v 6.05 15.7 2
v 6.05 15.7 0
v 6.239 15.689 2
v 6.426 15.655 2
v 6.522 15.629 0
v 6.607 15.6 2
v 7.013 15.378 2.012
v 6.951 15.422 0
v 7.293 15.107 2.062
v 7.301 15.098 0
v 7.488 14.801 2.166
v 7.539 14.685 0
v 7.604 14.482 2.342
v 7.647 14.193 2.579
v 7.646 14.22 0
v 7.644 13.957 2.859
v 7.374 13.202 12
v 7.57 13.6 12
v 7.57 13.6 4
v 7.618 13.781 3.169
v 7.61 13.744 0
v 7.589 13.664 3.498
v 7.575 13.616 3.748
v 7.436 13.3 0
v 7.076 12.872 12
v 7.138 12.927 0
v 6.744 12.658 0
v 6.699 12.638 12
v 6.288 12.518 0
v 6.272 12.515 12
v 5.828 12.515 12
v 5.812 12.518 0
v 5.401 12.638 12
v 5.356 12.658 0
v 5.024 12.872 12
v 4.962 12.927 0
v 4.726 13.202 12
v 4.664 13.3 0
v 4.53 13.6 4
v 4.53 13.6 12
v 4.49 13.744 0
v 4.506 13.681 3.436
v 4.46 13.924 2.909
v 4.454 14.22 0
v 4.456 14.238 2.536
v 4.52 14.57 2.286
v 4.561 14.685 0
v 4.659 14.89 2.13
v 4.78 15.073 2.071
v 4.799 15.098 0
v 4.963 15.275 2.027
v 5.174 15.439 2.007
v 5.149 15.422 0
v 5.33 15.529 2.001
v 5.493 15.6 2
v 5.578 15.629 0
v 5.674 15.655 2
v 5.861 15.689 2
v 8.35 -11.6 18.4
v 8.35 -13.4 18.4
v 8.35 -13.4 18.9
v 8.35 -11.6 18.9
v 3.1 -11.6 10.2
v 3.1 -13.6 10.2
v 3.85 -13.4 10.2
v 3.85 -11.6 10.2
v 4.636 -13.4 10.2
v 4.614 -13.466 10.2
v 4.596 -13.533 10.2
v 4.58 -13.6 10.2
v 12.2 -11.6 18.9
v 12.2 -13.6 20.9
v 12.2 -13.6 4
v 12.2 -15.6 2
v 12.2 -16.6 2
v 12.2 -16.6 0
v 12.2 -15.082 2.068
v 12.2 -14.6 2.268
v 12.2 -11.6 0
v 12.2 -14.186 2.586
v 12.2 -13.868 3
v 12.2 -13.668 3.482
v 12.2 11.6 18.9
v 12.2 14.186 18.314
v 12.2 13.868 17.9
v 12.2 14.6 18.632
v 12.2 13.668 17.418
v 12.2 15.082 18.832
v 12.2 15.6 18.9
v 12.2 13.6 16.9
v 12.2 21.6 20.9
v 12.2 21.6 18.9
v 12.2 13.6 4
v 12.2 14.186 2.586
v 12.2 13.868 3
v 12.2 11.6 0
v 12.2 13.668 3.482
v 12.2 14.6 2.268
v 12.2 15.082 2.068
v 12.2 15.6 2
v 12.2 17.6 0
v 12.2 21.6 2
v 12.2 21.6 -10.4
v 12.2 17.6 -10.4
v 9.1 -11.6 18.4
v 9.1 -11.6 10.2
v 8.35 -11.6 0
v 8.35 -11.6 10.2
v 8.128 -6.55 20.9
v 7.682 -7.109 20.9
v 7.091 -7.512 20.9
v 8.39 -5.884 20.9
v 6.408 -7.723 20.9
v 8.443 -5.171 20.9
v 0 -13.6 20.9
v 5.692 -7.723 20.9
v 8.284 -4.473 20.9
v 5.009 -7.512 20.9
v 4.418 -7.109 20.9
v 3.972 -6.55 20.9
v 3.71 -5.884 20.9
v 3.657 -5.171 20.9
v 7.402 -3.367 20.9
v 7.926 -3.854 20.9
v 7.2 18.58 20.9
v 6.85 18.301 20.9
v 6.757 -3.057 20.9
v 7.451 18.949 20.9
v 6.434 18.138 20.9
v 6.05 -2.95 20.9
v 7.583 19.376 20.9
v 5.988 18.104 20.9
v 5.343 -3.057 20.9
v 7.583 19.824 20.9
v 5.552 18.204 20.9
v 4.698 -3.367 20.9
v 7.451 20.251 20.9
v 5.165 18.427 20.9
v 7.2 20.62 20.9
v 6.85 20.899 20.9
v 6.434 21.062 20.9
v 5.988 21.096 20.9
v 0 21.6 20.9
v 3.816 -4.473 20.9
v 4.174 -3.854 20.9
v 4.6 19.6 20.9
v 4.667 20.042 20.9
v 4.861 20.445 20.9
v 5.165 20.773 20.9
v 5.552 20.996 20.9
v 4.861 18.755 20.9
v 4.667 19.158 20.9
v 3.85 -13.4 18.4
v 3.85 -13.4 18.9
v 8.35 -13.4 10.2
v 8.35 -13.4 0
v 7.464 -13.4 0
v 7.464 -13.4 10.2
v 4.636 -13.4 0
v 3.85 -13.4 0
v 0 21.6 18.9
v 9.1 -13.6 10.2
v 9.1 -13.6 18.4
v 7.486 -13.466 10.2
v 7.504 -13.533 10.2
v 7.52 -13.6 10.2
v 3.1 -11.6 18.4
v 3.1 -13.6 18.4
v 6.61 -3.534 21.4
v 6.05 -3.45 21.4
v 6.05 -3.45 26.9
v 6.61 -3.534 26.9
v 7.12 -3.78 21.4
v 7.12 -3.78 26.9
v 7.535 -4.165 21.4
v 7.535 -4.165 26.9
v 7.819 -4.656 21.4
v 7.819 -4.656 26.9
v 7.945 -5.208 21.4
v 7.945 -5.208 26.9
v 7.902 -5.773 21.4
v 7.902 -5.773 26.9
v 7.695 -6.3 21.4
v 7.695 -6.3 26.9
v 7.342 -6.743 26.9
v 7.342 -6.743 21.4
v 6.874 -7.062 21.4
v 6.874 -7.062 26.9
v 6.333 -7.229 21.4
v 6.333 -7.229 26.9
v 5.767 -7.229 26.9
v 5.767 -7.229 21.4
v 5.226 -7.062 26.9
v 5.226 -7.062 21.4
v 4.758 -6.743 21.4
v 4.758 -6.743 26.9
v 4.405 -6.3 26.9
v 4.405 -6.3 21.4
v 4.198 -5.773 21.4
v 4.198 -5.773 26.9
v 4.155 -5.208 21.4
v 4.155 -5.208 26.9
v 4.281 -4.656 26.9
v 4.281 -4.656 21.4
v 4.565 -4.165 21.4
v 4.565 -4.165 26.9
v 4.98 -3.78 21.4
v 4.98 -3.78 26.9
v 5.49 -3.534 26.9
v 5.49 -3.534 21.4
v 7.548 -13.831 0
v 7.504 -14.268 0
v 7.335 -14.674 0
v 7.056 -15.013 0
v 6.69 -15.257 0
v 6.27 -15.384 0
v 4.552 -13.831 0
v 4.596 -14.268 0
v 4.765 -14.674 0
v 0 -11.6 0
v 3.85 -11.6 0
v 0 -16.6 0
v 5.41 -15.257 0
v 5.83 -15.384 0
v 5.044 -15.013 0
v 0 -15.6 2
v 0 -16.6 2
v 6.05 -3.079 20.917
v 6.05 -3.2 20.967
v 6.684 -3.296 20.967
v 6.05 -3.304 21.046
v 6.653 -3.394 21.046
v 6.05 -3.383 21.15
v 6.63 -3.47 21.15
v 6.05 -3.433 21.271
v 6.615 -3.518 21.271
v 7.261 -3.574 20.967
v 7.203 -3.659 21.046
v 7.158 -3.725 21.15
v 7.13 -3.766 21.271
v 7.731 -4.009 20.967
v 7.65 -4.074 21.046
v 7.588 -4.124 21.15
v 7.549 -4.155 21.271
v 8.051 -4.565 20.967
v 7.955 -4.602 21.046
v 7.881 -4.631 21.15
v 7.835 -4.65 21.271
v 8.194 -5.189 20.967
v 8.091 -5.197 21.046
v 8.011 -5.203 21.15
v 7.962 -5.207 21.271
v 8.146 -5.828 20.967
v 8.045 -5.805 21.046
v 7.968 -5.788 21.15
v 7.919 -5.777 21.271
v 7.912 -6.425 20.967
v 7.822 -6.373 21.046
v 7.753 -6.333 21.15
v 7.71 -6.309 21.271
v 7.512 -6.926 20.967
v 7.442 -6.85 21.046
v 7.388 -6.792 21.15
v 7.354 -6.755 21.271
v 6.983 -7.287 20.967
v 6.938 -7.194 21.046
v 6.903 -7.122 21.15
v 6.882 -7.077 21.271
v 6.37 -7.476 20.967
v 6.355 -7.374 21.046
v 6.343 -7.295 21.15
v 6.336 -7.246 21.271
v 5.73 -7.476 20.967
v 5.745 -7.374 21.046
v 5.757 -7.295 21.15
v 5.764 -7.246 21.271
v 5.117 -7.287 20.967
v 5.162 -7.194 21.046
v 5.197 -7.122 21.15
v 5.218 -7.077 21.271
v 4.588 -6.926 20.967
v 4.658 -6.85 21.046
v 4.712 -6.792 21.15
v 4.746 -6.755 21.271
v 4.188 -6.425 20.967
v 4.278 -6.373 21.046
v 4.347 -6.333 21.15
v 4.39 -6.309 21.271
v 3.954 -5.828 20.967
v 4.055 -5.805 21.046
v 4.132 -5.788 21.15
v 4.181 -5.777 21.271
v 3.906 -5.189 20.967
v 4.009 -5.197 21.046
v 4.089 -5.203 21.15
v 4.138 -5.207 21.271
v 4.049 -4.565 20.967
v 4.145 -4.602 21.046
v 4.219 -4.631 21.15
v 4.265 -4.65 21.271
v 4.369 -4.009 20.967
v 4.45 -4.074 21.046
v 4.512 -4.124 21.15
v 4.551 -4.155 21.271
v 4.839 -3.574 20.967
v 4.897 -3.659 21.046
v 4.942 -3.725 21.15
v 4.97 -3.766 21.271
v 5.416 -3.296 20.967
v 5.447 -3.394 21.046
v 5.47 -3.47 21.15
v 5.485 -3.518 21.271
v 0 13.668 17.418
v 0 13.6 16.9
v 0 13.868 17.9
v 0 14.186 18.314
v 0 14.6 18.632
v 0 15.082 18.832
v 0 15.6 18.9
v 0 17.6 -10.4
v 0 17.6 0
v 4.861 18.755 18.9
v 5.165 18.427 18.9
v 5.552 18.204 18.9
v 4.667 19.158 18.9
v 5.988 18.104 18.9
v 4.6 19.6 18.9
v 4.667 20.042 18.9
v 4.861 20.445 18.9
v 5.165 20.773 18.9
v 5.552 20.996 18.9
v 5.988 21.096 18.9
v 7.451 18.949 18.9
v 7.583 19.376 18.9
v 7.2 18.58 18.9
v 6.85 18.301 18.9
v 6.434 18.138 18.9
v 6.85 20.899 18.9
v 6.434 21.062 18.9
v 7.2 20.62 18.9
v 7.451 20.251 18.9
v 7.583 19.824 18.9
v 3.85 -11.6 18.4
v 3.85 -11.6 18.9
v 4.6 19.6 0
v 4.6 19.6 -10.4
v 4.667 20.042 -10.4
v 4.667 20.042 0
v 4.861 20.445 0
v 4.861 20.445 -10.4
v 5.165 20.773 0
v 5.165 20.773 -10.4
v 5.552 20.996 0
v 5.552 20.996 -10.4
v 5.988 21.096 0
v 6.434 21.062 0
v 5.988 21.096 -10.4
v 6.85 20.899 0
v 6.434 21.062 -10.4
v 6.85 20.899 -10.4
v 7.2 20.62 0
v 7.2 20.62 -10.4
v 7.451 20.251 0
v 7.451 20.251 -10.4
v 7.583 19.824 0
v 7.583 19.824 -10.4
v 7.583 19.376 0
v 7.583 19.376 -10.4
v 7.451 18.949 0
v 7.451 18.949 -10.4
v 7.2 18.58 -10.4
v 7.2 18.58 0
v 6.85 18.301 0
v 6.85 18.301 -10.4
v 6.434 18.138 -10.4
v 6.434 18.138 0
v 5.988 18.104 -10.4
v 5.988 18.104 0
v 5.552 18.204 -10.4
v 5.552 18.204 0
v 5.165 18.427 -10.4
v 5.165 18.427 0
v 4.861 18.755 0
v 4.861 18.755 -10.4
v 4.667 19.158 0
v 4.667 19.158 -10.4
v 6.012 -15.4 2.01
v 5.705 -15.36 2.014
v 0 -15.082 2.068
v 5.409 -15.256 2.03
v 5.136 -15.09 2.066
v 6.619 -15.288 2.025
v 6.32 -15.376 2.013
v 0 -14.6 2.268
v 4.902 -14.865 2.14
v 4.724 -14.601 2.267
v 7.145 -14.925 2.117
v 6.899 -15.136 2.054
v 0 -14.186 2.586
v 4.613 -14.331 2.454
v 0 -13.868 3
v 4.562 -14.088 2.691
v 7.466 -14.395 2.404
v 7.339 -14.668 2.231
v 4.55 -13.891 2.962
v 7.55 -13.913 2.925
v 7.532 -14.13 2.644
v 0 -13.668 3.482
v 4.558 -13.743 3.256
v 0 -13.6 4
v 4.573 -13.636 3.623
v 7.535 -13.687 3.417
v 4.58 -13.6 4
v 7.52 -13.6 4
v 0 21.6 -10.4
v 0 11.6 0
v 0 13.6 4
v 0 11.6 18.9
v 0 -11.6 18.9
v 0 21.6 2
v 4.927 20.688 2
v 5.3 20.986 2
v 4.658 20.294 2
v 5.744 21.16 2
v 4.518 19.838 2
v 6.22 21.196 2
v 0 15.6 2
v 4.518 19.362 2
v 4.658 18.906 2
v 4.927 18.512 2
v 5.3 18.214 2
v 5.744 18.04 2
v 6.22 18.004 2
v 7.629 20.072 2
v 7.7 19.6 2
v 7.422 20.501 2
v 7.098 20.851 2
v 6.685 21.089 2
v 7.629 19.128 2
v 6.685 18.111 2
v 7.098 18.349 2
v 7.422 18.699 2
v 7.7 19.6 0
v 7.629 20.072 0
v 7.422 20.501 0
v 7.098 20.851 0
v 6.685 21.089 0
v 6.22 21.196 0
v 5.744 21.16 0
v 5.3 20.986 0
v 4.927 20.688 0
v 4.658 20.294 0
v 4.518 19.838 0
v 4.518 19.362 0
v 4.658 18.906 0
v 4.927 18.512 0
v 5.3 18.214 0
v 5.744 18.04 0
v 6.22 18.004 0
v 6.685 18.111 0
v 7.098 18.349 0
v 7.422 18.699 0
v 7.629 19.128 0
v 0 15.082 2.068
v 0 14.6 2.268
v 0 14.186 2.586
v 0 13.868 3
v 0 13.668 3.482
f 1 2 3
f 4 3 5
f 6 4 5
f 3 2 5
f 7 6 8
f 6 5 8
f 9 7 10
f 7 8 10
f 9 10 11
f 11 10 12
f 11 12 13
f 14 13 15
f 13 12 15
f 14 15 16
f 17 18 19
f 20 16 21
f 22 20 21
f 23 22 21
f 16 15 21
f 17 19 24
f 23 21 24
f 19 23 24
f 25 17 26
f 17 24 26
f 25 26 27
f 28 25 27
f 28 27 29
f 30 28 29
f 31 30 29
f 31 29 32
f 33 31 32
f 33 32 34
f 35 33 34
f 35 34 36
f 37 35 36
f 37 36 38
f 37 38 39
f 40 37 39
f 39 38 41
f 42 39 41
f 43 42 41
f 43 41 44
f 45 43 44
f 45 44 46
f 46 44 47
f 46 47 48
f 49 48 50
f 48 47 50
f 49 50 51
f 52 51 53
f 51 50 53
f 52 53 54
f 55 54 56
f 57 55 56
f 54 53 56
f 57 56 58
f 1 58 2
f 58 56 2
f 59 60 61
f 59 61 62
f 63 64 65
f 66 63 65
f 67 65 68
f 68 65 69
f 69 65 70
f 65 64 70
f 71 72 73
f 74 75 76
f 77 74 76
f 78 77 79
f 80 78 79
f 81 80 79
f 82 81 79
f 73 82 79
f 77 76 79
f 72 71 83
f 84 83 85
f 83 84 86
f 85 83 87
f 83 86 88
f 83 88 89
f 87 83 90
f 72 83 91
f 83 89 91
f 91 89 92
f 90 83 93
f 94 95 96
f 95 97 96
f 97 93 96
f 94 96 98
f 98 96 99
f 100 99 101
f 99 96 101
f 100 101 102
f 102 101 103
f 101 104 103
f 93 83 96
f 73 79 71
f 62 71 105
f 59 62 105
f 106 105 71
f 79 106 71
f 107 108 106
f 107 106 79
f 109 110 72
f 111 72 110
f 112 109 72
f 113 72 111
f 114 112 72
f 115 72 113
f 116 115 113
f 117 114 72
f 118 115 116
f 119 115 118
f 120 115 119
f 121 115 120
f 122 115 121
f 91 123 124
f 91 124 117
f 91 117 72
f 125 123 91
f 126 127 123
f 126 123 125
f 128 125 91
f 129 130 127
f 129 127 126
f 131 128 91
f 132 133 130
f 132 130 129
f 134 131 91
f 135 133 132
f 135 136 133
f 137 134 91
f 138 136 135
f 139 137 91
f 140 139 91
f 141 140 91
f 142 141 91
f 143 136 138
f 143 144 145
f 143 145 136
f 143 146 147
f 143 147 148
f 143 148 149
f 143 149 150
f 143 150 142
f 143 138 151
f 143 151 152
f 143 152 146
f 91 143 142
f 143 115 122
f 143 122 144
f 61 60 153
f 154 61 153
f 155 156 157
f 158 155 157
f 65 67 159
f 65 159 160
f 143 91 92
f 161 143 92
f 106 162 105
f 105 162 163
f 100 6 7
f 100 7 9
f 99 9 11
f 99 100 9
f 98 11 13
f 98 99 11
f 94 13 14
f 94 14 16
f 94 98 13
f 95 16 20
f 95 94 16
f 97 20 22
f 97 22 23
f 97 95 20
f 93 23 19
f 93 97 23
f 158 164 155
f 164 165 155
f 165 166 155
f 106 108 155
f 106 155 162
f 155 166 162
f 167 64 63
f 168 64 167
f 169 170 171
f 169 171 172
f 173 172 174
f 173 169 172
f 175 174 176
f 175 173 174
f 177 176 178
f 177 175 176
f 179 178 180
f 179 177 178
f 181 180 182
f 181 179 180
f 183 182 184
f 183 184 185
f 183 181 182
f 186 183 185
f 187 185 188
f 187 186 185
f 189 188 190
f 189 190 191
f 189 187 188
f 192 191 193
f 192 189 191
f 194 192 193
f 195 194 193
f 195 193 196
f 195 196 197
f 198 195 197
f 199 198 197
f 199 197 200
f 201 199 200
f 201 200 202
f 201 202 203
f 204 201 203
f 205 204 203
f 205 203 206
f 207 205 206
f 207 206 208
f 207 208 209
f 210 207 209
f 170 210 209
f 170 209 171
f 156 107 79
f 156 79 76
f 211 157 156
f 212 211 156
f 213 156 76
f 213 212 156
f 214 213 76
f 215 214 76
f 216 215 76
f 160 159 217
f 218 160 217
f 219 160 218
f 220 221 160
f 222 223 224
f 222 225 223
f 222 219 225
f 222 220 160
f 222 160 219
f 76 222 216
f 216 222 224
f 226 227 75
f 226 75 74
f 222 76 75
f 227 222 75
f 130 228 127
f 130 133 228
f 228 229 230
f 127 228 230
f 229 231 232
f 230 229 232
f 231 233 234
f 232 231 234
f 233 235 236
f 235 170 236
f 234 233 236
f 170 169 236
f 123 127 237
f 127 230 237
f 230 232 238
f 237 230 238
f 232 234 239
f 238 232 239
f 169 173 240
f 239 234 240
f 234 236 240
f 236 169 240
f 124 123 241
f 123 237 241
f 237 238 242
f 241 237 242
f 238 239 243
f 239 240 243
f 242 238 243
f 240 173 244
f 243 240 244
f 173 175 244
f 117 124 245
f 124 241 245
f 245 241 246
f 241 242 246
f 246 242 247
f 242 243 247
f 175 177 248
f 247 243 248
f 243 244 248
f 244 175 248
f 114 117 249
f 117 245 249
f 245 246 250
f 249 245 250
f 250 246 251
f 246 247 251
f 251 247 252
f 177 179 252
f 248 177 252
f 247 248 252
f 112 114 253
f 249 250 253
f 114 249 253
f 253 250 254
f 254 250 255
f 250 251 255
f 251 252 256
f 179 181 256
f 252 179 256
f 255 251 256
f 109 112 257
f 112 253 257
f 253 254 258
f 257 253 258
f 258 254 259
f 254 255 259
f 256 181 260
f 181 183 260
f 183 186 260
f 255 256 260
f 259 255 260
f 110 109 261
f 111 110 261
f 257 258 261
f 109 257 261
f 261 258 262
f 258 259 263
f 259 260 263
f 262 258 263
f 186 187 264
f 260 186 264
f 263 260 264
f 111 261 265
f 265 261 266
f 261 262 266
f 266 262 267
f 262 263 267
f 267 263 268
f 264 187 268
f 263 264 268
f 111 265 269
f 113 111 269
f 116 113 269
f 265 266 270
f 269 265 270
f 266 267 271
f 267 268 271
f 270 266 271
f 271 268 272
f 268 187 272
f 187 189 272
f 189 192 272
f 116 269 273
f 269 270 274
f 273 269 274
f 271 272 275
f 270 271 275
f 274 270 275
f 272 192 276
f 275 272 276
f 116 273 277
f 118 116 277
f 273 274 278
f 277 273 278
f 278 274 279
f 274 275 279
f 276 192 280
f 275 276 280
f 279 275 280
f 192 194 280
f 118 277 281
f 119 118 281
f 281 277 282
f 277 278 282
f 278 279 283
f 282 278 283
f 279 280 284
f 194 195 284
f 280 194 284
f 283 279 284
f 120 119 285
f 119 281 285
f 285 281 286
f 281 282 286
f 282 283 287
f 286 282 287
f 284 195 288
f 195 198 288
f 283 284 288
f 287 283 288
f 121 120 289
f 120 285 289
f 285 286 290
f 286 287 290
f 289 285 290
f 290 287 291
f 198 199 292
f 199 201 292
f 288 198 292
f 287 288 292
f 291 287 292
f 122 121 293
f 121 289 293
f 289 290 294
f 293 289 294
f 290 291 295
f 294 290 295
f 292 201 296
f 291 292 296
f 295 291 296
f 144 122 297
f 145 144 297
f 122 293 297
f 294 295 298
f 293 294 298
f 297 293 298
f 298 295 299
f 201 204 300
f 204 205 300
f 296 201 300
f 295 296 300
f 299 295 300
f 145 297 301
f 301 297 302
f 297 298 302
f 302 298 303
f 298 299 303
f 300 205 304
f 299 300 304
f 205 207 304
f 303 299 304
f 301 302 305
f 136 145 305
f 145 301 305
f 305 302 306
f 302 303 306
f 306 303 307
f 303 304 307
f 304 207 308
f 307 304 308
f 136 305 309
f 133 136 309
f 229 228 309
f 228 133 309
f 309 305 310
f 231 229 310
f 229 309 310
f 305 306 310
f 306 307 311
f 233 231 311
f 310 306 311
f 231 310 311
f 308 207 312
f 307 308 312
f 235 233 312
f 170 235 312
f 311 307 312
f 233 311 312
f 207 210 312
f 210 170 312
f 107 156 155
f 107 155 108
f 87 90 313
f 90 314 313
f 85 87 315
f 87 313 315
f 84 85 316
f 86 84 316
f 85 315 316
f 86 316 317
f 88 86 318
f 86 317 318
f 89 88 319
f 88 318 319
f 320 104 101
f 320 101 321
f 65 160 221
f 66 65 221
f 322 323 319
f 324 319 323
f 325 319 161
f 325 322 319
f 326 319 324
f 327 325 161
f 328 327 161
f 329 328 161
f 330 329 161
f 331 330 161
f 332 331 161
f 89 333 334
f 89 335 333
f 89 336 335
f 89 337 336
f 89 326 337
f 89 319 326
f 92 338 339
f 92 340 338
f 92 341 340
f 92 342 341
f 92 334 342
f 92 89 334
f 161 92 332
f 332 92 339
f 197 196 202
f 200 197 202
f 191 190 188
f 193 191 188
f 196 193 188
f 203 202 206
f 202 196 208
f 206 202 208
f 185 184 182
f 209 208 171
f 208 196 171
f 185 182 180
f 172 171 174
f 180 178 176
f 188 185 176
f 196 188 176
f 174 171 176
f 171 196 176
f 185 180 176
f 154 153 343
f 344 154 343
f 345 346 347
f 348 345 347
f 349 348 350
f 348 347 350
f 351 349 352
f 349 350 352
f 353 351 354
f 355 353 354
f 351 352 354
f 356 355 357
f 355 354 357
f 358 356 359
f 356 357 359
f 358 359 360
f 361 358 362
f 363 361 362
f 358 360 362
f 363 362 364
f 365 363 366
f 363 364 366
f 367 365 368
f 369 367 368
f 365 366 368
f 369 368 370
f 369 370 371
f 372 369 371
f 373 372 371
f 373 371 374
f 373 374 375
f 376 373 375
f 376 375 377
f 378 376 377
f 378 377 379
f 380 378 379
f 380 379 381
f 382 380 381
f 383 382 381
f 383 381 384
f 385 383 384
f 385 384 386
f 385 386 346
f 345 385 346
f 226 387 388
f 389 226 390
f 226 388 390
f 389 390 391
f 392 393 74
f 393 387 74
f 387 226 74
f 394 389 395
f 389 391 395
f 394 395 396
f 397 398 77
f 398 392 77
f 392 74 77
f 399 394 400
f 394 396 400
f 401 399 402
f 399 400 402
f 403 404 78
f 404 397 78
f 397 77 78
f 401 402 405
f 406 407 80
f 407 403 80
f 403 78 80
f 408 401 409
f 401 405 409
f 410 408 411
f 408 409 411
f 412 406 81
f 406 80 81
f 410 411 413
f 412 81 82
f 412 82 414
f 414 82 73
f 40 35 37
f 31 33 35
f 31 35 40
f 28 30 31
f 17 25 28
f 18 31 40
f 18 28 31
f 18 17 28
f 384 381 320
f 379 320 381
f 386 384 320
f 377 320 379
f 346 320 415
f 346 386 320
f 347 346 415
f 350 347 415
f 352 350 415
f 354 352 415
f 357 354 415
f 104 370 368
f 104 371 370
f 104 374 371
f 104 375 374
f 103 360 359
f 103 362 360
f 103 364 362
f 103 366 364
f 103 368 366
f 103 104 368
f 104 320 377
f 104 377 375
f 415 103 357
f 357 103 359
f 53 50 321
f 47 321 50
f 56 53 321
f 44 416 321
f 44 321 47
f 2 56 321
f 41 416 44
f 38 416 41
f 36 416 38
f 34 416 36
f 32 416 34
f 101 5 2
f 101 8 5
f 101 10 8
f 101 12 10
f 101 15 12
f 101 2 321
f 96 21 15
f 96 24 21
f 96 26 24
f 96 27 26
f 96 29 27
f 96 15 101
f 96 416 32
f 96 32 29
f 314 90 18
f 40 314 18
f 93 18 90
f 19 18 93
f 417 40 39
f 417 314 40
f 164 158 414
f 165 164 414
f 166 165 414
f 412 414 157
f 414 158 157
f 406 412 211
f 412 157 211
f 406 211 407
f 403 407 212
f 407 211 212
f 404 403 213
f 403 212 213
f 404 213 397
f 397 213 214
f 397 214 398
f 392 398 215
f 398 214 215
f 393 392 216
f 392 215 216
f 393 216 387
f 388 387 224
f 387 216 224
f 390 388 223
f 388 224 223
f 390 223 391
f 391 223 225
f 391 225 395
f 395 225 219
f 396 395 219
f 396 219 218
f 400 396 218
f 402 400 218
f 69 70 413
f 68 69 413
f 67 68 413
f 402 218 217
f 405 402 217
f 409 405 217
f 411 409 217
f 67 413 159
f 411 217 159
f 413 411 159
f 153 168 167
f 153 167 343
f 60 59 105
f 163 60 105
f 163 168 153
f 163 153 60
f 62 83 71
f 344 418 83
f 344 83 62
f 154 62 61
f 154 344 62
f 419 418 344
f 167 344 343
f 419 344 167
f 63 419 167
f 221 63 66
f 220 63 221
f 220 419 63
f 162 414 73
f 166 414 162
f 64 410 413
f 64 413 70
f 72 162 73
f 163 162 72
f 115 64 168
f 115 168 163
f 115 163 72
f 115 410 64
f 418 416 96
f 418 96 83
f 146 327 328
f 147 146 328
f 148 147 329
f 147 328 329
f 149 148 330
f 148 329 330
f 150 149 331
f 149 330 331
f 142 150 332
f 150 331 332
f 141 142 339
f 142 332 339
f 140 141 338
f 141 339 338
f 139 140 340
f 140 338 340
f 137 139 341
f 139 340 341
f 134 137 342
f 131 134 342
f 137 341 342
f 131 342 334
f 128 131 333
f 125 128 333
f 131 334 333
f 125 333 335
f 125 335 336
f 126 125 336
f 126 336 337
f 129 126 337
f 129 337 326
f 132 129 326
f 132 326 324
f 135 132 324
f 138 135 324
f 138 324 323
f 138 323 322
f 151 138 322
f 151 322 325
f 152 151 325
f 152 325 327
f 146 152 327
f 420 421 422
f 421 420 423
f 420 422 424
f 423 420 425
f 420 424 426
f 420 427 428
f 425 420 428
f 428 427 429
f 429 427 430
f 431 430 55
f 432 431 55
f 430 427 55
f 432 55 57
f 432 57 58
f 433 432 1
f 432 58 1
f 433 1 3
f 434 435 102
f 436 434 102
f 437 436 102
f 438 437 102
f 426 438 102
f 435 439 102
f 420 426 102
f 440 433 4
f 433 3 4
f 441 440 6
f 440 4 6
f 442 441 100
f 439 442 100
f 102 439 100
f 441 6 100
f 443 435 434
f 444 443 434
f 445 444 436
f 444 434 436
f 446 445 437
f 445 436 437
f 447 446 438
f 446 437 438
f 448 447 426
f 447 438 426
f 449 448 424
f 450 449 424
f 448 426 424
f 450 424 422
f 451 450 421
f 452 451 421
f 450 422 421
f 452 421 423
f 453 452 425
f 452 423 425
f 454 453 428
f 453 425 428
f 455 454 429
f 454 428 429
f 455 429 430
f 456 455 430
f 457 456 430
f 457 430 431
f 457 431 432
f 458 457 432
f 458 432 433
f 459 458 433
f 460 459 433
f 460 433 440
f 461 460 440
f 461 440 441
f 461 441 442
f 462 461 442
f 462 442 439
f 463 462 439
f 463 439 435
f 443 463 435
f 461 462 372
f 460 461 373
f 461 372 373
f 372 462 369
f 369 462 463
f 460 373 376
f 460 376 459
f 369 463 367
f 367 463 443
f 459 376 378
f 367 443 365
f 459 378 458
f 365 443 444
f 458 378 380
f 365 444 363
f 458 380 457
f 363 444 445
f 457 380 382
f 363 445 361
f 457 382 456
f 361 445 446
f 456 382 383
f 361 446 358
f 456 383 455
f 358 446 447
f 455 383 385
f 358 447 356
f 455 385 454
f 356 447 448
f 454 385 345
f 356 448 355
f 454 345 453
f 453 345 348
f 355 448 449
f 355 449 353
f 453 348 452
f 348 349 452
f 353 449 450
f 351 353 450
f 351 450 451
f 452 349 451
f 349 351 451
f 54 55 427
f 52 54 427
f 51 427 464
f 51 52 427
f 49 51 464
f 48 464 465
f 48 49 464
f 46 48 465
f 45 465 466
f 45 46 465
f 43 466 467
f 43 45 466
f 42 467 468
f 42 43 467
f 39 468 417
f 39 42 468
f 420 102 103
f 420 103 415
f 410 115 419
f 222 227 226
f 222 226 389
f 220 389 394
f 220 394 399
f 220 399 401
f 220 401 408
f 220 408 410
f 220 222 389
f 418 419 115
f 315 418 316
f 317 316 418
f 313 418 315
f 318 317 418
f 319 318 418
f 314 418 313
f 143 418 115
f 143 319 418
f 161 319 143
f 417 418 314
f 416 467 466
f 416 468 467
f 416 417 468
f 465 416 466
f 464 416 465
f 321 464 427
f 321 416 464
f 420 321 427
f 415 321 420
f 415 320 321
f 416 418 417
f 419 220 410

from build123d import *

# Parameters (mm, degrees)
EXTRUDE_THIN1_DEPTH = 12.2
SKETCH2_R           = 1.3
CUT_EXTRUDE1_DEPTH  = 28.957288853
SKETCH3_W           = 2
SKETCH3_H           = 10
BOSS_EXTRUDE1_DEPTH = 12.2
FILLET1_R           = 2
SKETCH4_R           = 1.5
CUT_EXTRUDE2_DEPTH  = 32.186695881
SKETCH5_W           = 12.2
SKETCH5_H           = 2
BOSS_EXTRUDE2_DEPTH = 5
SKETCH8_R           = 1.6
CUT_EXTRUDE4_DEPTH  = 3
BOSS_EXTRUDE3_START = 11.4
SKETCH9_W           = 12.2
SKETCH9_H           = 4
SKETCH9_R           = 1.5
BOSS_EXTRUDE3_DEPTH = 11.4
SKETCH10_R          = 1.5
SKETCH10_R_2        = 1.6
CUT_EXTRUDE5_DEPTH  = 12
SKETCH12_R          = 1.9
BOSS_EXTRUDE5_DEPTH = 8
SKETCH13_W          = 1
SKETCH13_H          = 4
CUT_EXTRUDE6_DEPTH  = 37.592485601
FILLET4_R           = 0.5
CUT_EXTRUDE7_REACH  = 38.592
SKETCH14_W          = 4.5
SKETCH14_H          = 1.8
CUT_EXTRUDE8_REACH  = 47.951
SKETCH15_W          = 6
SKETCH15_H          = 8.2


with BuildPart() as part:
    # Sketch1 → Extrude-Thin1 (new body)
    with BuildSketch(Plane(origin=(0, 0, 0), x_dir=(0, 0, -1), z_dir=(1, 0, 0))):
        Polygon((0, 16.6), (0, 11.6), (-18.9, 11.6), (-18.9, -11.6), (0, -11.6), (0, -16.6), (-2, -16.6), (-2, -13.6), (-20.9, -13.6), (-20.9, 13.6), (-2, 13.6), (-2, 16.6), align=None)
    extrude(amount=EXTRUDE_THIN1_DEPTH)

    # Sketch2 → Cut-Extrude1 (cut, through all)
    with BuildSketch(Plane(origin=(0, 0, 18.9), x_dir=(-1, 0, 0), z_dir=(0, 0, -1))):
        with Locations(Location((-6.05, -5.15, 0), (0, 0, 90))):
            Circle(SKETCH2_R)
    extrude(amount=-CUT_EXTRUDE1_DEPTH, mode=Mode.SUBTRACT)

    # Sketch3 → Boss-Extrude1 (add)
    with BuildSketch(Plane(origin=(12.2, 0, 0), x_dir=(0, 0, -1), z_dir=(1, 0, 0))):
        with Locations((-19.9, 16.6)):
            Rectangle(SKETCH3_W, SKETCH3_H)
    extrude(amount=-BOSS_EXTRUDE1_DEPTH)

    # Fillet1
    fillet1_edges = [part.edges().sort_by_distance(p)[0] for p in [
        (6.1, -13.6, 2),
        (6.1, 13.6, 2),
        (6.1, 13.6, 18.9),
    ]]
    fillet(fillet1_edges, radius=FILLET1_R)

    # Sketch4 → Cut-Extrude2 (cut, through all)
    with BuildSketch(Plane(origin=(0, 0, 18.9), x_dir=(-1, 0, 0), z_dir=(0, 0, -1))):
        with Locations((-6.1, 19.6)):
            Circle(SKETCH4_R)
    extrude(amount=-CUT_EXTRUDE2_DEPTH, mode=Mode.SUBTRACT)

    # Sketch5 → Boss-Extrude2 (add)
    with BuildSketch(Plane(origin=(0, 16.6, 0), x_dir=(1, 0, 0), z_dir=(0, 1, 0))):
        with Locations((6.1, -1)):
            Rectangle(SKETCH5_W, SKETCH5_H)
    extrude(amount=BOSS_EXTRUDE2_DEPTH)

    # Sketch8 → Cut-Extrude4 (cut)
    with BuildSketch(Plane.XY.offset(2)):
        with Locations((6.1, 19.6)):
            Circle(SKETCH8_R)
    extrude(amount=-CUT_EXTRUDE4_DEPTH, mode=Mode.SUBTRACT)

    # Sketch9 → Boss-Extrude3 (add)
    with BuildSketch(Plane(origin=(0, 0, 0), x_dir=(-1, 0, 0), z_dir=(0, 0, -1)).offset(BOSS_EXTRUDE3_START)):
        with Locations((-6.1, 19.6)):
            Rectangle(SKETCH9_W, SKETCH9_H)
        with Locations((-6.1, 19.6)):
            Circle(SKETCH9_R, mode=Mode.SUBTRACT)
    extrude(amount=-BOSS_EXTRUDE3_DEPTH)

    # Sketch10 → Cut-Extrude5 (cut)
    with BuildSketch(Plane(origin=(0, 0, 0), x_dir=(-1, 0, 0), z_dir=(0, 0, -1))):
        with Locations(Location((-6.05, -13.9, 0), (0, 0, 90))):
            Circle(SKETCH10_R)
        with Locations(Location((-6.05, 14.1, 0), (0, 0, 90))):
            Circle(SKETCH10_R_2)
    extrude(amount=-CUT_EXTRUDE5_DEPTH, mode=Mode.SUBTRACT)

    # Sketch12 → Boss-Extrude5 (add)
    with BuildSketch(Plane(origin=(0, 0, 18.9), x_dir=(-1, 0, 0), z_dir=(0, 0, -1))):
        with Locations(Location((-6.05, -5.35, 0), (0, 0, 90))):
            Circle(SKETCH12_R)
    extrude(amount=-BOSS_EXTRUDE5_DEPTH)

    # Sketch13 → Cut-Extrude6 (cut, through all)
    with BuildSketch(Plane(origin=(12.2, 0, 0), x_dir=(0, 0, -1), z_dir=(1, 0, 0))):
        with Locations((10.9, 19.6)):
            Rectangle(SKETCH13_W, SKETCH13_H)
    extrude(amount=-CUT_EXTRUDE6_DEPTH, mode=Mode.SUBTRACT)

    # Fillet4
    fillet4_edges = [part.edges().sort_by_distance(p)[0] for p in [
        (6.05, -7.25, 20.9),
    ]]
    fillet(fillet4_edges, radius=FILLET4_R)

    # Cut-Extrude7: up to this face of the body (flat: up to its plane)
    cut_extrude7_end = Plane(part.part.faces().sort_by_distance((6.1, 0, 18.9))[0])
    # Sketch14 → Cut-Extrude7 (cut, up to the picked face)
    with BuildSketch(Plane(origin=(0, 0, 0), x_dir=(-1, 0, 0), z_dir=(0, 0, -1)), mode=Mode.PRIVATE) as cut_extrude7_sk1:
        with Locations((-6.1, -12.5)):
            Rectangle(SKETCH14_W, SKETCH14_H)
    cut_extrude7_tool1 = split(extrude(cut_extrude7_sk1.sketch, amount=-CUT_EXTRUDE7_REACH, mode=Mode.PRIVATE), bisect_by=cut_extrude7_end, keep=Keep.BOTH, mode=Mode.PRIVATE)
    add(cut_extrude7_tool1.solids().sort_by(Axis((6.1, -12.5, 0), (0, 0, 1)))[0], mode=Mode.SUBTRACT)

    # Cut-Extrude8: up to this face of the body (flat: up to its plane)
    cut_extrude8_end = Plane(part.part.faces().sort_by_distance((1.925, -11.6, 9.45))[0])
    # Sketch15 → Cut-Extrude8 (cut, up to the picked face)
    with BuildSketch(Plane.XZ.offset(13.6), mode=Mode.PRIVATE) as cut_extrude8_sk1:
        with Locations((6.1, 14.3)):
            Rectangle(SKETCH15_W, SKETCH15_H)
    cut_extrude8_tool1 = split(extrude(cut_extrude8_sk1.sketch, amount=-CUT_EXTRUDE8_REACH, mode=Mode.PRIVATE), bisect_by=cut_extrude8_end, keep=Keep.BOTH, mode=Mode.PRIVATE)
    add(cut_extrude8_tool1.solids().sort_by(Axis((6.1, -13.6, 14.3), (0, 1, 0)))[0], mode=Mode.SUBTRACT)


solid = part.part
